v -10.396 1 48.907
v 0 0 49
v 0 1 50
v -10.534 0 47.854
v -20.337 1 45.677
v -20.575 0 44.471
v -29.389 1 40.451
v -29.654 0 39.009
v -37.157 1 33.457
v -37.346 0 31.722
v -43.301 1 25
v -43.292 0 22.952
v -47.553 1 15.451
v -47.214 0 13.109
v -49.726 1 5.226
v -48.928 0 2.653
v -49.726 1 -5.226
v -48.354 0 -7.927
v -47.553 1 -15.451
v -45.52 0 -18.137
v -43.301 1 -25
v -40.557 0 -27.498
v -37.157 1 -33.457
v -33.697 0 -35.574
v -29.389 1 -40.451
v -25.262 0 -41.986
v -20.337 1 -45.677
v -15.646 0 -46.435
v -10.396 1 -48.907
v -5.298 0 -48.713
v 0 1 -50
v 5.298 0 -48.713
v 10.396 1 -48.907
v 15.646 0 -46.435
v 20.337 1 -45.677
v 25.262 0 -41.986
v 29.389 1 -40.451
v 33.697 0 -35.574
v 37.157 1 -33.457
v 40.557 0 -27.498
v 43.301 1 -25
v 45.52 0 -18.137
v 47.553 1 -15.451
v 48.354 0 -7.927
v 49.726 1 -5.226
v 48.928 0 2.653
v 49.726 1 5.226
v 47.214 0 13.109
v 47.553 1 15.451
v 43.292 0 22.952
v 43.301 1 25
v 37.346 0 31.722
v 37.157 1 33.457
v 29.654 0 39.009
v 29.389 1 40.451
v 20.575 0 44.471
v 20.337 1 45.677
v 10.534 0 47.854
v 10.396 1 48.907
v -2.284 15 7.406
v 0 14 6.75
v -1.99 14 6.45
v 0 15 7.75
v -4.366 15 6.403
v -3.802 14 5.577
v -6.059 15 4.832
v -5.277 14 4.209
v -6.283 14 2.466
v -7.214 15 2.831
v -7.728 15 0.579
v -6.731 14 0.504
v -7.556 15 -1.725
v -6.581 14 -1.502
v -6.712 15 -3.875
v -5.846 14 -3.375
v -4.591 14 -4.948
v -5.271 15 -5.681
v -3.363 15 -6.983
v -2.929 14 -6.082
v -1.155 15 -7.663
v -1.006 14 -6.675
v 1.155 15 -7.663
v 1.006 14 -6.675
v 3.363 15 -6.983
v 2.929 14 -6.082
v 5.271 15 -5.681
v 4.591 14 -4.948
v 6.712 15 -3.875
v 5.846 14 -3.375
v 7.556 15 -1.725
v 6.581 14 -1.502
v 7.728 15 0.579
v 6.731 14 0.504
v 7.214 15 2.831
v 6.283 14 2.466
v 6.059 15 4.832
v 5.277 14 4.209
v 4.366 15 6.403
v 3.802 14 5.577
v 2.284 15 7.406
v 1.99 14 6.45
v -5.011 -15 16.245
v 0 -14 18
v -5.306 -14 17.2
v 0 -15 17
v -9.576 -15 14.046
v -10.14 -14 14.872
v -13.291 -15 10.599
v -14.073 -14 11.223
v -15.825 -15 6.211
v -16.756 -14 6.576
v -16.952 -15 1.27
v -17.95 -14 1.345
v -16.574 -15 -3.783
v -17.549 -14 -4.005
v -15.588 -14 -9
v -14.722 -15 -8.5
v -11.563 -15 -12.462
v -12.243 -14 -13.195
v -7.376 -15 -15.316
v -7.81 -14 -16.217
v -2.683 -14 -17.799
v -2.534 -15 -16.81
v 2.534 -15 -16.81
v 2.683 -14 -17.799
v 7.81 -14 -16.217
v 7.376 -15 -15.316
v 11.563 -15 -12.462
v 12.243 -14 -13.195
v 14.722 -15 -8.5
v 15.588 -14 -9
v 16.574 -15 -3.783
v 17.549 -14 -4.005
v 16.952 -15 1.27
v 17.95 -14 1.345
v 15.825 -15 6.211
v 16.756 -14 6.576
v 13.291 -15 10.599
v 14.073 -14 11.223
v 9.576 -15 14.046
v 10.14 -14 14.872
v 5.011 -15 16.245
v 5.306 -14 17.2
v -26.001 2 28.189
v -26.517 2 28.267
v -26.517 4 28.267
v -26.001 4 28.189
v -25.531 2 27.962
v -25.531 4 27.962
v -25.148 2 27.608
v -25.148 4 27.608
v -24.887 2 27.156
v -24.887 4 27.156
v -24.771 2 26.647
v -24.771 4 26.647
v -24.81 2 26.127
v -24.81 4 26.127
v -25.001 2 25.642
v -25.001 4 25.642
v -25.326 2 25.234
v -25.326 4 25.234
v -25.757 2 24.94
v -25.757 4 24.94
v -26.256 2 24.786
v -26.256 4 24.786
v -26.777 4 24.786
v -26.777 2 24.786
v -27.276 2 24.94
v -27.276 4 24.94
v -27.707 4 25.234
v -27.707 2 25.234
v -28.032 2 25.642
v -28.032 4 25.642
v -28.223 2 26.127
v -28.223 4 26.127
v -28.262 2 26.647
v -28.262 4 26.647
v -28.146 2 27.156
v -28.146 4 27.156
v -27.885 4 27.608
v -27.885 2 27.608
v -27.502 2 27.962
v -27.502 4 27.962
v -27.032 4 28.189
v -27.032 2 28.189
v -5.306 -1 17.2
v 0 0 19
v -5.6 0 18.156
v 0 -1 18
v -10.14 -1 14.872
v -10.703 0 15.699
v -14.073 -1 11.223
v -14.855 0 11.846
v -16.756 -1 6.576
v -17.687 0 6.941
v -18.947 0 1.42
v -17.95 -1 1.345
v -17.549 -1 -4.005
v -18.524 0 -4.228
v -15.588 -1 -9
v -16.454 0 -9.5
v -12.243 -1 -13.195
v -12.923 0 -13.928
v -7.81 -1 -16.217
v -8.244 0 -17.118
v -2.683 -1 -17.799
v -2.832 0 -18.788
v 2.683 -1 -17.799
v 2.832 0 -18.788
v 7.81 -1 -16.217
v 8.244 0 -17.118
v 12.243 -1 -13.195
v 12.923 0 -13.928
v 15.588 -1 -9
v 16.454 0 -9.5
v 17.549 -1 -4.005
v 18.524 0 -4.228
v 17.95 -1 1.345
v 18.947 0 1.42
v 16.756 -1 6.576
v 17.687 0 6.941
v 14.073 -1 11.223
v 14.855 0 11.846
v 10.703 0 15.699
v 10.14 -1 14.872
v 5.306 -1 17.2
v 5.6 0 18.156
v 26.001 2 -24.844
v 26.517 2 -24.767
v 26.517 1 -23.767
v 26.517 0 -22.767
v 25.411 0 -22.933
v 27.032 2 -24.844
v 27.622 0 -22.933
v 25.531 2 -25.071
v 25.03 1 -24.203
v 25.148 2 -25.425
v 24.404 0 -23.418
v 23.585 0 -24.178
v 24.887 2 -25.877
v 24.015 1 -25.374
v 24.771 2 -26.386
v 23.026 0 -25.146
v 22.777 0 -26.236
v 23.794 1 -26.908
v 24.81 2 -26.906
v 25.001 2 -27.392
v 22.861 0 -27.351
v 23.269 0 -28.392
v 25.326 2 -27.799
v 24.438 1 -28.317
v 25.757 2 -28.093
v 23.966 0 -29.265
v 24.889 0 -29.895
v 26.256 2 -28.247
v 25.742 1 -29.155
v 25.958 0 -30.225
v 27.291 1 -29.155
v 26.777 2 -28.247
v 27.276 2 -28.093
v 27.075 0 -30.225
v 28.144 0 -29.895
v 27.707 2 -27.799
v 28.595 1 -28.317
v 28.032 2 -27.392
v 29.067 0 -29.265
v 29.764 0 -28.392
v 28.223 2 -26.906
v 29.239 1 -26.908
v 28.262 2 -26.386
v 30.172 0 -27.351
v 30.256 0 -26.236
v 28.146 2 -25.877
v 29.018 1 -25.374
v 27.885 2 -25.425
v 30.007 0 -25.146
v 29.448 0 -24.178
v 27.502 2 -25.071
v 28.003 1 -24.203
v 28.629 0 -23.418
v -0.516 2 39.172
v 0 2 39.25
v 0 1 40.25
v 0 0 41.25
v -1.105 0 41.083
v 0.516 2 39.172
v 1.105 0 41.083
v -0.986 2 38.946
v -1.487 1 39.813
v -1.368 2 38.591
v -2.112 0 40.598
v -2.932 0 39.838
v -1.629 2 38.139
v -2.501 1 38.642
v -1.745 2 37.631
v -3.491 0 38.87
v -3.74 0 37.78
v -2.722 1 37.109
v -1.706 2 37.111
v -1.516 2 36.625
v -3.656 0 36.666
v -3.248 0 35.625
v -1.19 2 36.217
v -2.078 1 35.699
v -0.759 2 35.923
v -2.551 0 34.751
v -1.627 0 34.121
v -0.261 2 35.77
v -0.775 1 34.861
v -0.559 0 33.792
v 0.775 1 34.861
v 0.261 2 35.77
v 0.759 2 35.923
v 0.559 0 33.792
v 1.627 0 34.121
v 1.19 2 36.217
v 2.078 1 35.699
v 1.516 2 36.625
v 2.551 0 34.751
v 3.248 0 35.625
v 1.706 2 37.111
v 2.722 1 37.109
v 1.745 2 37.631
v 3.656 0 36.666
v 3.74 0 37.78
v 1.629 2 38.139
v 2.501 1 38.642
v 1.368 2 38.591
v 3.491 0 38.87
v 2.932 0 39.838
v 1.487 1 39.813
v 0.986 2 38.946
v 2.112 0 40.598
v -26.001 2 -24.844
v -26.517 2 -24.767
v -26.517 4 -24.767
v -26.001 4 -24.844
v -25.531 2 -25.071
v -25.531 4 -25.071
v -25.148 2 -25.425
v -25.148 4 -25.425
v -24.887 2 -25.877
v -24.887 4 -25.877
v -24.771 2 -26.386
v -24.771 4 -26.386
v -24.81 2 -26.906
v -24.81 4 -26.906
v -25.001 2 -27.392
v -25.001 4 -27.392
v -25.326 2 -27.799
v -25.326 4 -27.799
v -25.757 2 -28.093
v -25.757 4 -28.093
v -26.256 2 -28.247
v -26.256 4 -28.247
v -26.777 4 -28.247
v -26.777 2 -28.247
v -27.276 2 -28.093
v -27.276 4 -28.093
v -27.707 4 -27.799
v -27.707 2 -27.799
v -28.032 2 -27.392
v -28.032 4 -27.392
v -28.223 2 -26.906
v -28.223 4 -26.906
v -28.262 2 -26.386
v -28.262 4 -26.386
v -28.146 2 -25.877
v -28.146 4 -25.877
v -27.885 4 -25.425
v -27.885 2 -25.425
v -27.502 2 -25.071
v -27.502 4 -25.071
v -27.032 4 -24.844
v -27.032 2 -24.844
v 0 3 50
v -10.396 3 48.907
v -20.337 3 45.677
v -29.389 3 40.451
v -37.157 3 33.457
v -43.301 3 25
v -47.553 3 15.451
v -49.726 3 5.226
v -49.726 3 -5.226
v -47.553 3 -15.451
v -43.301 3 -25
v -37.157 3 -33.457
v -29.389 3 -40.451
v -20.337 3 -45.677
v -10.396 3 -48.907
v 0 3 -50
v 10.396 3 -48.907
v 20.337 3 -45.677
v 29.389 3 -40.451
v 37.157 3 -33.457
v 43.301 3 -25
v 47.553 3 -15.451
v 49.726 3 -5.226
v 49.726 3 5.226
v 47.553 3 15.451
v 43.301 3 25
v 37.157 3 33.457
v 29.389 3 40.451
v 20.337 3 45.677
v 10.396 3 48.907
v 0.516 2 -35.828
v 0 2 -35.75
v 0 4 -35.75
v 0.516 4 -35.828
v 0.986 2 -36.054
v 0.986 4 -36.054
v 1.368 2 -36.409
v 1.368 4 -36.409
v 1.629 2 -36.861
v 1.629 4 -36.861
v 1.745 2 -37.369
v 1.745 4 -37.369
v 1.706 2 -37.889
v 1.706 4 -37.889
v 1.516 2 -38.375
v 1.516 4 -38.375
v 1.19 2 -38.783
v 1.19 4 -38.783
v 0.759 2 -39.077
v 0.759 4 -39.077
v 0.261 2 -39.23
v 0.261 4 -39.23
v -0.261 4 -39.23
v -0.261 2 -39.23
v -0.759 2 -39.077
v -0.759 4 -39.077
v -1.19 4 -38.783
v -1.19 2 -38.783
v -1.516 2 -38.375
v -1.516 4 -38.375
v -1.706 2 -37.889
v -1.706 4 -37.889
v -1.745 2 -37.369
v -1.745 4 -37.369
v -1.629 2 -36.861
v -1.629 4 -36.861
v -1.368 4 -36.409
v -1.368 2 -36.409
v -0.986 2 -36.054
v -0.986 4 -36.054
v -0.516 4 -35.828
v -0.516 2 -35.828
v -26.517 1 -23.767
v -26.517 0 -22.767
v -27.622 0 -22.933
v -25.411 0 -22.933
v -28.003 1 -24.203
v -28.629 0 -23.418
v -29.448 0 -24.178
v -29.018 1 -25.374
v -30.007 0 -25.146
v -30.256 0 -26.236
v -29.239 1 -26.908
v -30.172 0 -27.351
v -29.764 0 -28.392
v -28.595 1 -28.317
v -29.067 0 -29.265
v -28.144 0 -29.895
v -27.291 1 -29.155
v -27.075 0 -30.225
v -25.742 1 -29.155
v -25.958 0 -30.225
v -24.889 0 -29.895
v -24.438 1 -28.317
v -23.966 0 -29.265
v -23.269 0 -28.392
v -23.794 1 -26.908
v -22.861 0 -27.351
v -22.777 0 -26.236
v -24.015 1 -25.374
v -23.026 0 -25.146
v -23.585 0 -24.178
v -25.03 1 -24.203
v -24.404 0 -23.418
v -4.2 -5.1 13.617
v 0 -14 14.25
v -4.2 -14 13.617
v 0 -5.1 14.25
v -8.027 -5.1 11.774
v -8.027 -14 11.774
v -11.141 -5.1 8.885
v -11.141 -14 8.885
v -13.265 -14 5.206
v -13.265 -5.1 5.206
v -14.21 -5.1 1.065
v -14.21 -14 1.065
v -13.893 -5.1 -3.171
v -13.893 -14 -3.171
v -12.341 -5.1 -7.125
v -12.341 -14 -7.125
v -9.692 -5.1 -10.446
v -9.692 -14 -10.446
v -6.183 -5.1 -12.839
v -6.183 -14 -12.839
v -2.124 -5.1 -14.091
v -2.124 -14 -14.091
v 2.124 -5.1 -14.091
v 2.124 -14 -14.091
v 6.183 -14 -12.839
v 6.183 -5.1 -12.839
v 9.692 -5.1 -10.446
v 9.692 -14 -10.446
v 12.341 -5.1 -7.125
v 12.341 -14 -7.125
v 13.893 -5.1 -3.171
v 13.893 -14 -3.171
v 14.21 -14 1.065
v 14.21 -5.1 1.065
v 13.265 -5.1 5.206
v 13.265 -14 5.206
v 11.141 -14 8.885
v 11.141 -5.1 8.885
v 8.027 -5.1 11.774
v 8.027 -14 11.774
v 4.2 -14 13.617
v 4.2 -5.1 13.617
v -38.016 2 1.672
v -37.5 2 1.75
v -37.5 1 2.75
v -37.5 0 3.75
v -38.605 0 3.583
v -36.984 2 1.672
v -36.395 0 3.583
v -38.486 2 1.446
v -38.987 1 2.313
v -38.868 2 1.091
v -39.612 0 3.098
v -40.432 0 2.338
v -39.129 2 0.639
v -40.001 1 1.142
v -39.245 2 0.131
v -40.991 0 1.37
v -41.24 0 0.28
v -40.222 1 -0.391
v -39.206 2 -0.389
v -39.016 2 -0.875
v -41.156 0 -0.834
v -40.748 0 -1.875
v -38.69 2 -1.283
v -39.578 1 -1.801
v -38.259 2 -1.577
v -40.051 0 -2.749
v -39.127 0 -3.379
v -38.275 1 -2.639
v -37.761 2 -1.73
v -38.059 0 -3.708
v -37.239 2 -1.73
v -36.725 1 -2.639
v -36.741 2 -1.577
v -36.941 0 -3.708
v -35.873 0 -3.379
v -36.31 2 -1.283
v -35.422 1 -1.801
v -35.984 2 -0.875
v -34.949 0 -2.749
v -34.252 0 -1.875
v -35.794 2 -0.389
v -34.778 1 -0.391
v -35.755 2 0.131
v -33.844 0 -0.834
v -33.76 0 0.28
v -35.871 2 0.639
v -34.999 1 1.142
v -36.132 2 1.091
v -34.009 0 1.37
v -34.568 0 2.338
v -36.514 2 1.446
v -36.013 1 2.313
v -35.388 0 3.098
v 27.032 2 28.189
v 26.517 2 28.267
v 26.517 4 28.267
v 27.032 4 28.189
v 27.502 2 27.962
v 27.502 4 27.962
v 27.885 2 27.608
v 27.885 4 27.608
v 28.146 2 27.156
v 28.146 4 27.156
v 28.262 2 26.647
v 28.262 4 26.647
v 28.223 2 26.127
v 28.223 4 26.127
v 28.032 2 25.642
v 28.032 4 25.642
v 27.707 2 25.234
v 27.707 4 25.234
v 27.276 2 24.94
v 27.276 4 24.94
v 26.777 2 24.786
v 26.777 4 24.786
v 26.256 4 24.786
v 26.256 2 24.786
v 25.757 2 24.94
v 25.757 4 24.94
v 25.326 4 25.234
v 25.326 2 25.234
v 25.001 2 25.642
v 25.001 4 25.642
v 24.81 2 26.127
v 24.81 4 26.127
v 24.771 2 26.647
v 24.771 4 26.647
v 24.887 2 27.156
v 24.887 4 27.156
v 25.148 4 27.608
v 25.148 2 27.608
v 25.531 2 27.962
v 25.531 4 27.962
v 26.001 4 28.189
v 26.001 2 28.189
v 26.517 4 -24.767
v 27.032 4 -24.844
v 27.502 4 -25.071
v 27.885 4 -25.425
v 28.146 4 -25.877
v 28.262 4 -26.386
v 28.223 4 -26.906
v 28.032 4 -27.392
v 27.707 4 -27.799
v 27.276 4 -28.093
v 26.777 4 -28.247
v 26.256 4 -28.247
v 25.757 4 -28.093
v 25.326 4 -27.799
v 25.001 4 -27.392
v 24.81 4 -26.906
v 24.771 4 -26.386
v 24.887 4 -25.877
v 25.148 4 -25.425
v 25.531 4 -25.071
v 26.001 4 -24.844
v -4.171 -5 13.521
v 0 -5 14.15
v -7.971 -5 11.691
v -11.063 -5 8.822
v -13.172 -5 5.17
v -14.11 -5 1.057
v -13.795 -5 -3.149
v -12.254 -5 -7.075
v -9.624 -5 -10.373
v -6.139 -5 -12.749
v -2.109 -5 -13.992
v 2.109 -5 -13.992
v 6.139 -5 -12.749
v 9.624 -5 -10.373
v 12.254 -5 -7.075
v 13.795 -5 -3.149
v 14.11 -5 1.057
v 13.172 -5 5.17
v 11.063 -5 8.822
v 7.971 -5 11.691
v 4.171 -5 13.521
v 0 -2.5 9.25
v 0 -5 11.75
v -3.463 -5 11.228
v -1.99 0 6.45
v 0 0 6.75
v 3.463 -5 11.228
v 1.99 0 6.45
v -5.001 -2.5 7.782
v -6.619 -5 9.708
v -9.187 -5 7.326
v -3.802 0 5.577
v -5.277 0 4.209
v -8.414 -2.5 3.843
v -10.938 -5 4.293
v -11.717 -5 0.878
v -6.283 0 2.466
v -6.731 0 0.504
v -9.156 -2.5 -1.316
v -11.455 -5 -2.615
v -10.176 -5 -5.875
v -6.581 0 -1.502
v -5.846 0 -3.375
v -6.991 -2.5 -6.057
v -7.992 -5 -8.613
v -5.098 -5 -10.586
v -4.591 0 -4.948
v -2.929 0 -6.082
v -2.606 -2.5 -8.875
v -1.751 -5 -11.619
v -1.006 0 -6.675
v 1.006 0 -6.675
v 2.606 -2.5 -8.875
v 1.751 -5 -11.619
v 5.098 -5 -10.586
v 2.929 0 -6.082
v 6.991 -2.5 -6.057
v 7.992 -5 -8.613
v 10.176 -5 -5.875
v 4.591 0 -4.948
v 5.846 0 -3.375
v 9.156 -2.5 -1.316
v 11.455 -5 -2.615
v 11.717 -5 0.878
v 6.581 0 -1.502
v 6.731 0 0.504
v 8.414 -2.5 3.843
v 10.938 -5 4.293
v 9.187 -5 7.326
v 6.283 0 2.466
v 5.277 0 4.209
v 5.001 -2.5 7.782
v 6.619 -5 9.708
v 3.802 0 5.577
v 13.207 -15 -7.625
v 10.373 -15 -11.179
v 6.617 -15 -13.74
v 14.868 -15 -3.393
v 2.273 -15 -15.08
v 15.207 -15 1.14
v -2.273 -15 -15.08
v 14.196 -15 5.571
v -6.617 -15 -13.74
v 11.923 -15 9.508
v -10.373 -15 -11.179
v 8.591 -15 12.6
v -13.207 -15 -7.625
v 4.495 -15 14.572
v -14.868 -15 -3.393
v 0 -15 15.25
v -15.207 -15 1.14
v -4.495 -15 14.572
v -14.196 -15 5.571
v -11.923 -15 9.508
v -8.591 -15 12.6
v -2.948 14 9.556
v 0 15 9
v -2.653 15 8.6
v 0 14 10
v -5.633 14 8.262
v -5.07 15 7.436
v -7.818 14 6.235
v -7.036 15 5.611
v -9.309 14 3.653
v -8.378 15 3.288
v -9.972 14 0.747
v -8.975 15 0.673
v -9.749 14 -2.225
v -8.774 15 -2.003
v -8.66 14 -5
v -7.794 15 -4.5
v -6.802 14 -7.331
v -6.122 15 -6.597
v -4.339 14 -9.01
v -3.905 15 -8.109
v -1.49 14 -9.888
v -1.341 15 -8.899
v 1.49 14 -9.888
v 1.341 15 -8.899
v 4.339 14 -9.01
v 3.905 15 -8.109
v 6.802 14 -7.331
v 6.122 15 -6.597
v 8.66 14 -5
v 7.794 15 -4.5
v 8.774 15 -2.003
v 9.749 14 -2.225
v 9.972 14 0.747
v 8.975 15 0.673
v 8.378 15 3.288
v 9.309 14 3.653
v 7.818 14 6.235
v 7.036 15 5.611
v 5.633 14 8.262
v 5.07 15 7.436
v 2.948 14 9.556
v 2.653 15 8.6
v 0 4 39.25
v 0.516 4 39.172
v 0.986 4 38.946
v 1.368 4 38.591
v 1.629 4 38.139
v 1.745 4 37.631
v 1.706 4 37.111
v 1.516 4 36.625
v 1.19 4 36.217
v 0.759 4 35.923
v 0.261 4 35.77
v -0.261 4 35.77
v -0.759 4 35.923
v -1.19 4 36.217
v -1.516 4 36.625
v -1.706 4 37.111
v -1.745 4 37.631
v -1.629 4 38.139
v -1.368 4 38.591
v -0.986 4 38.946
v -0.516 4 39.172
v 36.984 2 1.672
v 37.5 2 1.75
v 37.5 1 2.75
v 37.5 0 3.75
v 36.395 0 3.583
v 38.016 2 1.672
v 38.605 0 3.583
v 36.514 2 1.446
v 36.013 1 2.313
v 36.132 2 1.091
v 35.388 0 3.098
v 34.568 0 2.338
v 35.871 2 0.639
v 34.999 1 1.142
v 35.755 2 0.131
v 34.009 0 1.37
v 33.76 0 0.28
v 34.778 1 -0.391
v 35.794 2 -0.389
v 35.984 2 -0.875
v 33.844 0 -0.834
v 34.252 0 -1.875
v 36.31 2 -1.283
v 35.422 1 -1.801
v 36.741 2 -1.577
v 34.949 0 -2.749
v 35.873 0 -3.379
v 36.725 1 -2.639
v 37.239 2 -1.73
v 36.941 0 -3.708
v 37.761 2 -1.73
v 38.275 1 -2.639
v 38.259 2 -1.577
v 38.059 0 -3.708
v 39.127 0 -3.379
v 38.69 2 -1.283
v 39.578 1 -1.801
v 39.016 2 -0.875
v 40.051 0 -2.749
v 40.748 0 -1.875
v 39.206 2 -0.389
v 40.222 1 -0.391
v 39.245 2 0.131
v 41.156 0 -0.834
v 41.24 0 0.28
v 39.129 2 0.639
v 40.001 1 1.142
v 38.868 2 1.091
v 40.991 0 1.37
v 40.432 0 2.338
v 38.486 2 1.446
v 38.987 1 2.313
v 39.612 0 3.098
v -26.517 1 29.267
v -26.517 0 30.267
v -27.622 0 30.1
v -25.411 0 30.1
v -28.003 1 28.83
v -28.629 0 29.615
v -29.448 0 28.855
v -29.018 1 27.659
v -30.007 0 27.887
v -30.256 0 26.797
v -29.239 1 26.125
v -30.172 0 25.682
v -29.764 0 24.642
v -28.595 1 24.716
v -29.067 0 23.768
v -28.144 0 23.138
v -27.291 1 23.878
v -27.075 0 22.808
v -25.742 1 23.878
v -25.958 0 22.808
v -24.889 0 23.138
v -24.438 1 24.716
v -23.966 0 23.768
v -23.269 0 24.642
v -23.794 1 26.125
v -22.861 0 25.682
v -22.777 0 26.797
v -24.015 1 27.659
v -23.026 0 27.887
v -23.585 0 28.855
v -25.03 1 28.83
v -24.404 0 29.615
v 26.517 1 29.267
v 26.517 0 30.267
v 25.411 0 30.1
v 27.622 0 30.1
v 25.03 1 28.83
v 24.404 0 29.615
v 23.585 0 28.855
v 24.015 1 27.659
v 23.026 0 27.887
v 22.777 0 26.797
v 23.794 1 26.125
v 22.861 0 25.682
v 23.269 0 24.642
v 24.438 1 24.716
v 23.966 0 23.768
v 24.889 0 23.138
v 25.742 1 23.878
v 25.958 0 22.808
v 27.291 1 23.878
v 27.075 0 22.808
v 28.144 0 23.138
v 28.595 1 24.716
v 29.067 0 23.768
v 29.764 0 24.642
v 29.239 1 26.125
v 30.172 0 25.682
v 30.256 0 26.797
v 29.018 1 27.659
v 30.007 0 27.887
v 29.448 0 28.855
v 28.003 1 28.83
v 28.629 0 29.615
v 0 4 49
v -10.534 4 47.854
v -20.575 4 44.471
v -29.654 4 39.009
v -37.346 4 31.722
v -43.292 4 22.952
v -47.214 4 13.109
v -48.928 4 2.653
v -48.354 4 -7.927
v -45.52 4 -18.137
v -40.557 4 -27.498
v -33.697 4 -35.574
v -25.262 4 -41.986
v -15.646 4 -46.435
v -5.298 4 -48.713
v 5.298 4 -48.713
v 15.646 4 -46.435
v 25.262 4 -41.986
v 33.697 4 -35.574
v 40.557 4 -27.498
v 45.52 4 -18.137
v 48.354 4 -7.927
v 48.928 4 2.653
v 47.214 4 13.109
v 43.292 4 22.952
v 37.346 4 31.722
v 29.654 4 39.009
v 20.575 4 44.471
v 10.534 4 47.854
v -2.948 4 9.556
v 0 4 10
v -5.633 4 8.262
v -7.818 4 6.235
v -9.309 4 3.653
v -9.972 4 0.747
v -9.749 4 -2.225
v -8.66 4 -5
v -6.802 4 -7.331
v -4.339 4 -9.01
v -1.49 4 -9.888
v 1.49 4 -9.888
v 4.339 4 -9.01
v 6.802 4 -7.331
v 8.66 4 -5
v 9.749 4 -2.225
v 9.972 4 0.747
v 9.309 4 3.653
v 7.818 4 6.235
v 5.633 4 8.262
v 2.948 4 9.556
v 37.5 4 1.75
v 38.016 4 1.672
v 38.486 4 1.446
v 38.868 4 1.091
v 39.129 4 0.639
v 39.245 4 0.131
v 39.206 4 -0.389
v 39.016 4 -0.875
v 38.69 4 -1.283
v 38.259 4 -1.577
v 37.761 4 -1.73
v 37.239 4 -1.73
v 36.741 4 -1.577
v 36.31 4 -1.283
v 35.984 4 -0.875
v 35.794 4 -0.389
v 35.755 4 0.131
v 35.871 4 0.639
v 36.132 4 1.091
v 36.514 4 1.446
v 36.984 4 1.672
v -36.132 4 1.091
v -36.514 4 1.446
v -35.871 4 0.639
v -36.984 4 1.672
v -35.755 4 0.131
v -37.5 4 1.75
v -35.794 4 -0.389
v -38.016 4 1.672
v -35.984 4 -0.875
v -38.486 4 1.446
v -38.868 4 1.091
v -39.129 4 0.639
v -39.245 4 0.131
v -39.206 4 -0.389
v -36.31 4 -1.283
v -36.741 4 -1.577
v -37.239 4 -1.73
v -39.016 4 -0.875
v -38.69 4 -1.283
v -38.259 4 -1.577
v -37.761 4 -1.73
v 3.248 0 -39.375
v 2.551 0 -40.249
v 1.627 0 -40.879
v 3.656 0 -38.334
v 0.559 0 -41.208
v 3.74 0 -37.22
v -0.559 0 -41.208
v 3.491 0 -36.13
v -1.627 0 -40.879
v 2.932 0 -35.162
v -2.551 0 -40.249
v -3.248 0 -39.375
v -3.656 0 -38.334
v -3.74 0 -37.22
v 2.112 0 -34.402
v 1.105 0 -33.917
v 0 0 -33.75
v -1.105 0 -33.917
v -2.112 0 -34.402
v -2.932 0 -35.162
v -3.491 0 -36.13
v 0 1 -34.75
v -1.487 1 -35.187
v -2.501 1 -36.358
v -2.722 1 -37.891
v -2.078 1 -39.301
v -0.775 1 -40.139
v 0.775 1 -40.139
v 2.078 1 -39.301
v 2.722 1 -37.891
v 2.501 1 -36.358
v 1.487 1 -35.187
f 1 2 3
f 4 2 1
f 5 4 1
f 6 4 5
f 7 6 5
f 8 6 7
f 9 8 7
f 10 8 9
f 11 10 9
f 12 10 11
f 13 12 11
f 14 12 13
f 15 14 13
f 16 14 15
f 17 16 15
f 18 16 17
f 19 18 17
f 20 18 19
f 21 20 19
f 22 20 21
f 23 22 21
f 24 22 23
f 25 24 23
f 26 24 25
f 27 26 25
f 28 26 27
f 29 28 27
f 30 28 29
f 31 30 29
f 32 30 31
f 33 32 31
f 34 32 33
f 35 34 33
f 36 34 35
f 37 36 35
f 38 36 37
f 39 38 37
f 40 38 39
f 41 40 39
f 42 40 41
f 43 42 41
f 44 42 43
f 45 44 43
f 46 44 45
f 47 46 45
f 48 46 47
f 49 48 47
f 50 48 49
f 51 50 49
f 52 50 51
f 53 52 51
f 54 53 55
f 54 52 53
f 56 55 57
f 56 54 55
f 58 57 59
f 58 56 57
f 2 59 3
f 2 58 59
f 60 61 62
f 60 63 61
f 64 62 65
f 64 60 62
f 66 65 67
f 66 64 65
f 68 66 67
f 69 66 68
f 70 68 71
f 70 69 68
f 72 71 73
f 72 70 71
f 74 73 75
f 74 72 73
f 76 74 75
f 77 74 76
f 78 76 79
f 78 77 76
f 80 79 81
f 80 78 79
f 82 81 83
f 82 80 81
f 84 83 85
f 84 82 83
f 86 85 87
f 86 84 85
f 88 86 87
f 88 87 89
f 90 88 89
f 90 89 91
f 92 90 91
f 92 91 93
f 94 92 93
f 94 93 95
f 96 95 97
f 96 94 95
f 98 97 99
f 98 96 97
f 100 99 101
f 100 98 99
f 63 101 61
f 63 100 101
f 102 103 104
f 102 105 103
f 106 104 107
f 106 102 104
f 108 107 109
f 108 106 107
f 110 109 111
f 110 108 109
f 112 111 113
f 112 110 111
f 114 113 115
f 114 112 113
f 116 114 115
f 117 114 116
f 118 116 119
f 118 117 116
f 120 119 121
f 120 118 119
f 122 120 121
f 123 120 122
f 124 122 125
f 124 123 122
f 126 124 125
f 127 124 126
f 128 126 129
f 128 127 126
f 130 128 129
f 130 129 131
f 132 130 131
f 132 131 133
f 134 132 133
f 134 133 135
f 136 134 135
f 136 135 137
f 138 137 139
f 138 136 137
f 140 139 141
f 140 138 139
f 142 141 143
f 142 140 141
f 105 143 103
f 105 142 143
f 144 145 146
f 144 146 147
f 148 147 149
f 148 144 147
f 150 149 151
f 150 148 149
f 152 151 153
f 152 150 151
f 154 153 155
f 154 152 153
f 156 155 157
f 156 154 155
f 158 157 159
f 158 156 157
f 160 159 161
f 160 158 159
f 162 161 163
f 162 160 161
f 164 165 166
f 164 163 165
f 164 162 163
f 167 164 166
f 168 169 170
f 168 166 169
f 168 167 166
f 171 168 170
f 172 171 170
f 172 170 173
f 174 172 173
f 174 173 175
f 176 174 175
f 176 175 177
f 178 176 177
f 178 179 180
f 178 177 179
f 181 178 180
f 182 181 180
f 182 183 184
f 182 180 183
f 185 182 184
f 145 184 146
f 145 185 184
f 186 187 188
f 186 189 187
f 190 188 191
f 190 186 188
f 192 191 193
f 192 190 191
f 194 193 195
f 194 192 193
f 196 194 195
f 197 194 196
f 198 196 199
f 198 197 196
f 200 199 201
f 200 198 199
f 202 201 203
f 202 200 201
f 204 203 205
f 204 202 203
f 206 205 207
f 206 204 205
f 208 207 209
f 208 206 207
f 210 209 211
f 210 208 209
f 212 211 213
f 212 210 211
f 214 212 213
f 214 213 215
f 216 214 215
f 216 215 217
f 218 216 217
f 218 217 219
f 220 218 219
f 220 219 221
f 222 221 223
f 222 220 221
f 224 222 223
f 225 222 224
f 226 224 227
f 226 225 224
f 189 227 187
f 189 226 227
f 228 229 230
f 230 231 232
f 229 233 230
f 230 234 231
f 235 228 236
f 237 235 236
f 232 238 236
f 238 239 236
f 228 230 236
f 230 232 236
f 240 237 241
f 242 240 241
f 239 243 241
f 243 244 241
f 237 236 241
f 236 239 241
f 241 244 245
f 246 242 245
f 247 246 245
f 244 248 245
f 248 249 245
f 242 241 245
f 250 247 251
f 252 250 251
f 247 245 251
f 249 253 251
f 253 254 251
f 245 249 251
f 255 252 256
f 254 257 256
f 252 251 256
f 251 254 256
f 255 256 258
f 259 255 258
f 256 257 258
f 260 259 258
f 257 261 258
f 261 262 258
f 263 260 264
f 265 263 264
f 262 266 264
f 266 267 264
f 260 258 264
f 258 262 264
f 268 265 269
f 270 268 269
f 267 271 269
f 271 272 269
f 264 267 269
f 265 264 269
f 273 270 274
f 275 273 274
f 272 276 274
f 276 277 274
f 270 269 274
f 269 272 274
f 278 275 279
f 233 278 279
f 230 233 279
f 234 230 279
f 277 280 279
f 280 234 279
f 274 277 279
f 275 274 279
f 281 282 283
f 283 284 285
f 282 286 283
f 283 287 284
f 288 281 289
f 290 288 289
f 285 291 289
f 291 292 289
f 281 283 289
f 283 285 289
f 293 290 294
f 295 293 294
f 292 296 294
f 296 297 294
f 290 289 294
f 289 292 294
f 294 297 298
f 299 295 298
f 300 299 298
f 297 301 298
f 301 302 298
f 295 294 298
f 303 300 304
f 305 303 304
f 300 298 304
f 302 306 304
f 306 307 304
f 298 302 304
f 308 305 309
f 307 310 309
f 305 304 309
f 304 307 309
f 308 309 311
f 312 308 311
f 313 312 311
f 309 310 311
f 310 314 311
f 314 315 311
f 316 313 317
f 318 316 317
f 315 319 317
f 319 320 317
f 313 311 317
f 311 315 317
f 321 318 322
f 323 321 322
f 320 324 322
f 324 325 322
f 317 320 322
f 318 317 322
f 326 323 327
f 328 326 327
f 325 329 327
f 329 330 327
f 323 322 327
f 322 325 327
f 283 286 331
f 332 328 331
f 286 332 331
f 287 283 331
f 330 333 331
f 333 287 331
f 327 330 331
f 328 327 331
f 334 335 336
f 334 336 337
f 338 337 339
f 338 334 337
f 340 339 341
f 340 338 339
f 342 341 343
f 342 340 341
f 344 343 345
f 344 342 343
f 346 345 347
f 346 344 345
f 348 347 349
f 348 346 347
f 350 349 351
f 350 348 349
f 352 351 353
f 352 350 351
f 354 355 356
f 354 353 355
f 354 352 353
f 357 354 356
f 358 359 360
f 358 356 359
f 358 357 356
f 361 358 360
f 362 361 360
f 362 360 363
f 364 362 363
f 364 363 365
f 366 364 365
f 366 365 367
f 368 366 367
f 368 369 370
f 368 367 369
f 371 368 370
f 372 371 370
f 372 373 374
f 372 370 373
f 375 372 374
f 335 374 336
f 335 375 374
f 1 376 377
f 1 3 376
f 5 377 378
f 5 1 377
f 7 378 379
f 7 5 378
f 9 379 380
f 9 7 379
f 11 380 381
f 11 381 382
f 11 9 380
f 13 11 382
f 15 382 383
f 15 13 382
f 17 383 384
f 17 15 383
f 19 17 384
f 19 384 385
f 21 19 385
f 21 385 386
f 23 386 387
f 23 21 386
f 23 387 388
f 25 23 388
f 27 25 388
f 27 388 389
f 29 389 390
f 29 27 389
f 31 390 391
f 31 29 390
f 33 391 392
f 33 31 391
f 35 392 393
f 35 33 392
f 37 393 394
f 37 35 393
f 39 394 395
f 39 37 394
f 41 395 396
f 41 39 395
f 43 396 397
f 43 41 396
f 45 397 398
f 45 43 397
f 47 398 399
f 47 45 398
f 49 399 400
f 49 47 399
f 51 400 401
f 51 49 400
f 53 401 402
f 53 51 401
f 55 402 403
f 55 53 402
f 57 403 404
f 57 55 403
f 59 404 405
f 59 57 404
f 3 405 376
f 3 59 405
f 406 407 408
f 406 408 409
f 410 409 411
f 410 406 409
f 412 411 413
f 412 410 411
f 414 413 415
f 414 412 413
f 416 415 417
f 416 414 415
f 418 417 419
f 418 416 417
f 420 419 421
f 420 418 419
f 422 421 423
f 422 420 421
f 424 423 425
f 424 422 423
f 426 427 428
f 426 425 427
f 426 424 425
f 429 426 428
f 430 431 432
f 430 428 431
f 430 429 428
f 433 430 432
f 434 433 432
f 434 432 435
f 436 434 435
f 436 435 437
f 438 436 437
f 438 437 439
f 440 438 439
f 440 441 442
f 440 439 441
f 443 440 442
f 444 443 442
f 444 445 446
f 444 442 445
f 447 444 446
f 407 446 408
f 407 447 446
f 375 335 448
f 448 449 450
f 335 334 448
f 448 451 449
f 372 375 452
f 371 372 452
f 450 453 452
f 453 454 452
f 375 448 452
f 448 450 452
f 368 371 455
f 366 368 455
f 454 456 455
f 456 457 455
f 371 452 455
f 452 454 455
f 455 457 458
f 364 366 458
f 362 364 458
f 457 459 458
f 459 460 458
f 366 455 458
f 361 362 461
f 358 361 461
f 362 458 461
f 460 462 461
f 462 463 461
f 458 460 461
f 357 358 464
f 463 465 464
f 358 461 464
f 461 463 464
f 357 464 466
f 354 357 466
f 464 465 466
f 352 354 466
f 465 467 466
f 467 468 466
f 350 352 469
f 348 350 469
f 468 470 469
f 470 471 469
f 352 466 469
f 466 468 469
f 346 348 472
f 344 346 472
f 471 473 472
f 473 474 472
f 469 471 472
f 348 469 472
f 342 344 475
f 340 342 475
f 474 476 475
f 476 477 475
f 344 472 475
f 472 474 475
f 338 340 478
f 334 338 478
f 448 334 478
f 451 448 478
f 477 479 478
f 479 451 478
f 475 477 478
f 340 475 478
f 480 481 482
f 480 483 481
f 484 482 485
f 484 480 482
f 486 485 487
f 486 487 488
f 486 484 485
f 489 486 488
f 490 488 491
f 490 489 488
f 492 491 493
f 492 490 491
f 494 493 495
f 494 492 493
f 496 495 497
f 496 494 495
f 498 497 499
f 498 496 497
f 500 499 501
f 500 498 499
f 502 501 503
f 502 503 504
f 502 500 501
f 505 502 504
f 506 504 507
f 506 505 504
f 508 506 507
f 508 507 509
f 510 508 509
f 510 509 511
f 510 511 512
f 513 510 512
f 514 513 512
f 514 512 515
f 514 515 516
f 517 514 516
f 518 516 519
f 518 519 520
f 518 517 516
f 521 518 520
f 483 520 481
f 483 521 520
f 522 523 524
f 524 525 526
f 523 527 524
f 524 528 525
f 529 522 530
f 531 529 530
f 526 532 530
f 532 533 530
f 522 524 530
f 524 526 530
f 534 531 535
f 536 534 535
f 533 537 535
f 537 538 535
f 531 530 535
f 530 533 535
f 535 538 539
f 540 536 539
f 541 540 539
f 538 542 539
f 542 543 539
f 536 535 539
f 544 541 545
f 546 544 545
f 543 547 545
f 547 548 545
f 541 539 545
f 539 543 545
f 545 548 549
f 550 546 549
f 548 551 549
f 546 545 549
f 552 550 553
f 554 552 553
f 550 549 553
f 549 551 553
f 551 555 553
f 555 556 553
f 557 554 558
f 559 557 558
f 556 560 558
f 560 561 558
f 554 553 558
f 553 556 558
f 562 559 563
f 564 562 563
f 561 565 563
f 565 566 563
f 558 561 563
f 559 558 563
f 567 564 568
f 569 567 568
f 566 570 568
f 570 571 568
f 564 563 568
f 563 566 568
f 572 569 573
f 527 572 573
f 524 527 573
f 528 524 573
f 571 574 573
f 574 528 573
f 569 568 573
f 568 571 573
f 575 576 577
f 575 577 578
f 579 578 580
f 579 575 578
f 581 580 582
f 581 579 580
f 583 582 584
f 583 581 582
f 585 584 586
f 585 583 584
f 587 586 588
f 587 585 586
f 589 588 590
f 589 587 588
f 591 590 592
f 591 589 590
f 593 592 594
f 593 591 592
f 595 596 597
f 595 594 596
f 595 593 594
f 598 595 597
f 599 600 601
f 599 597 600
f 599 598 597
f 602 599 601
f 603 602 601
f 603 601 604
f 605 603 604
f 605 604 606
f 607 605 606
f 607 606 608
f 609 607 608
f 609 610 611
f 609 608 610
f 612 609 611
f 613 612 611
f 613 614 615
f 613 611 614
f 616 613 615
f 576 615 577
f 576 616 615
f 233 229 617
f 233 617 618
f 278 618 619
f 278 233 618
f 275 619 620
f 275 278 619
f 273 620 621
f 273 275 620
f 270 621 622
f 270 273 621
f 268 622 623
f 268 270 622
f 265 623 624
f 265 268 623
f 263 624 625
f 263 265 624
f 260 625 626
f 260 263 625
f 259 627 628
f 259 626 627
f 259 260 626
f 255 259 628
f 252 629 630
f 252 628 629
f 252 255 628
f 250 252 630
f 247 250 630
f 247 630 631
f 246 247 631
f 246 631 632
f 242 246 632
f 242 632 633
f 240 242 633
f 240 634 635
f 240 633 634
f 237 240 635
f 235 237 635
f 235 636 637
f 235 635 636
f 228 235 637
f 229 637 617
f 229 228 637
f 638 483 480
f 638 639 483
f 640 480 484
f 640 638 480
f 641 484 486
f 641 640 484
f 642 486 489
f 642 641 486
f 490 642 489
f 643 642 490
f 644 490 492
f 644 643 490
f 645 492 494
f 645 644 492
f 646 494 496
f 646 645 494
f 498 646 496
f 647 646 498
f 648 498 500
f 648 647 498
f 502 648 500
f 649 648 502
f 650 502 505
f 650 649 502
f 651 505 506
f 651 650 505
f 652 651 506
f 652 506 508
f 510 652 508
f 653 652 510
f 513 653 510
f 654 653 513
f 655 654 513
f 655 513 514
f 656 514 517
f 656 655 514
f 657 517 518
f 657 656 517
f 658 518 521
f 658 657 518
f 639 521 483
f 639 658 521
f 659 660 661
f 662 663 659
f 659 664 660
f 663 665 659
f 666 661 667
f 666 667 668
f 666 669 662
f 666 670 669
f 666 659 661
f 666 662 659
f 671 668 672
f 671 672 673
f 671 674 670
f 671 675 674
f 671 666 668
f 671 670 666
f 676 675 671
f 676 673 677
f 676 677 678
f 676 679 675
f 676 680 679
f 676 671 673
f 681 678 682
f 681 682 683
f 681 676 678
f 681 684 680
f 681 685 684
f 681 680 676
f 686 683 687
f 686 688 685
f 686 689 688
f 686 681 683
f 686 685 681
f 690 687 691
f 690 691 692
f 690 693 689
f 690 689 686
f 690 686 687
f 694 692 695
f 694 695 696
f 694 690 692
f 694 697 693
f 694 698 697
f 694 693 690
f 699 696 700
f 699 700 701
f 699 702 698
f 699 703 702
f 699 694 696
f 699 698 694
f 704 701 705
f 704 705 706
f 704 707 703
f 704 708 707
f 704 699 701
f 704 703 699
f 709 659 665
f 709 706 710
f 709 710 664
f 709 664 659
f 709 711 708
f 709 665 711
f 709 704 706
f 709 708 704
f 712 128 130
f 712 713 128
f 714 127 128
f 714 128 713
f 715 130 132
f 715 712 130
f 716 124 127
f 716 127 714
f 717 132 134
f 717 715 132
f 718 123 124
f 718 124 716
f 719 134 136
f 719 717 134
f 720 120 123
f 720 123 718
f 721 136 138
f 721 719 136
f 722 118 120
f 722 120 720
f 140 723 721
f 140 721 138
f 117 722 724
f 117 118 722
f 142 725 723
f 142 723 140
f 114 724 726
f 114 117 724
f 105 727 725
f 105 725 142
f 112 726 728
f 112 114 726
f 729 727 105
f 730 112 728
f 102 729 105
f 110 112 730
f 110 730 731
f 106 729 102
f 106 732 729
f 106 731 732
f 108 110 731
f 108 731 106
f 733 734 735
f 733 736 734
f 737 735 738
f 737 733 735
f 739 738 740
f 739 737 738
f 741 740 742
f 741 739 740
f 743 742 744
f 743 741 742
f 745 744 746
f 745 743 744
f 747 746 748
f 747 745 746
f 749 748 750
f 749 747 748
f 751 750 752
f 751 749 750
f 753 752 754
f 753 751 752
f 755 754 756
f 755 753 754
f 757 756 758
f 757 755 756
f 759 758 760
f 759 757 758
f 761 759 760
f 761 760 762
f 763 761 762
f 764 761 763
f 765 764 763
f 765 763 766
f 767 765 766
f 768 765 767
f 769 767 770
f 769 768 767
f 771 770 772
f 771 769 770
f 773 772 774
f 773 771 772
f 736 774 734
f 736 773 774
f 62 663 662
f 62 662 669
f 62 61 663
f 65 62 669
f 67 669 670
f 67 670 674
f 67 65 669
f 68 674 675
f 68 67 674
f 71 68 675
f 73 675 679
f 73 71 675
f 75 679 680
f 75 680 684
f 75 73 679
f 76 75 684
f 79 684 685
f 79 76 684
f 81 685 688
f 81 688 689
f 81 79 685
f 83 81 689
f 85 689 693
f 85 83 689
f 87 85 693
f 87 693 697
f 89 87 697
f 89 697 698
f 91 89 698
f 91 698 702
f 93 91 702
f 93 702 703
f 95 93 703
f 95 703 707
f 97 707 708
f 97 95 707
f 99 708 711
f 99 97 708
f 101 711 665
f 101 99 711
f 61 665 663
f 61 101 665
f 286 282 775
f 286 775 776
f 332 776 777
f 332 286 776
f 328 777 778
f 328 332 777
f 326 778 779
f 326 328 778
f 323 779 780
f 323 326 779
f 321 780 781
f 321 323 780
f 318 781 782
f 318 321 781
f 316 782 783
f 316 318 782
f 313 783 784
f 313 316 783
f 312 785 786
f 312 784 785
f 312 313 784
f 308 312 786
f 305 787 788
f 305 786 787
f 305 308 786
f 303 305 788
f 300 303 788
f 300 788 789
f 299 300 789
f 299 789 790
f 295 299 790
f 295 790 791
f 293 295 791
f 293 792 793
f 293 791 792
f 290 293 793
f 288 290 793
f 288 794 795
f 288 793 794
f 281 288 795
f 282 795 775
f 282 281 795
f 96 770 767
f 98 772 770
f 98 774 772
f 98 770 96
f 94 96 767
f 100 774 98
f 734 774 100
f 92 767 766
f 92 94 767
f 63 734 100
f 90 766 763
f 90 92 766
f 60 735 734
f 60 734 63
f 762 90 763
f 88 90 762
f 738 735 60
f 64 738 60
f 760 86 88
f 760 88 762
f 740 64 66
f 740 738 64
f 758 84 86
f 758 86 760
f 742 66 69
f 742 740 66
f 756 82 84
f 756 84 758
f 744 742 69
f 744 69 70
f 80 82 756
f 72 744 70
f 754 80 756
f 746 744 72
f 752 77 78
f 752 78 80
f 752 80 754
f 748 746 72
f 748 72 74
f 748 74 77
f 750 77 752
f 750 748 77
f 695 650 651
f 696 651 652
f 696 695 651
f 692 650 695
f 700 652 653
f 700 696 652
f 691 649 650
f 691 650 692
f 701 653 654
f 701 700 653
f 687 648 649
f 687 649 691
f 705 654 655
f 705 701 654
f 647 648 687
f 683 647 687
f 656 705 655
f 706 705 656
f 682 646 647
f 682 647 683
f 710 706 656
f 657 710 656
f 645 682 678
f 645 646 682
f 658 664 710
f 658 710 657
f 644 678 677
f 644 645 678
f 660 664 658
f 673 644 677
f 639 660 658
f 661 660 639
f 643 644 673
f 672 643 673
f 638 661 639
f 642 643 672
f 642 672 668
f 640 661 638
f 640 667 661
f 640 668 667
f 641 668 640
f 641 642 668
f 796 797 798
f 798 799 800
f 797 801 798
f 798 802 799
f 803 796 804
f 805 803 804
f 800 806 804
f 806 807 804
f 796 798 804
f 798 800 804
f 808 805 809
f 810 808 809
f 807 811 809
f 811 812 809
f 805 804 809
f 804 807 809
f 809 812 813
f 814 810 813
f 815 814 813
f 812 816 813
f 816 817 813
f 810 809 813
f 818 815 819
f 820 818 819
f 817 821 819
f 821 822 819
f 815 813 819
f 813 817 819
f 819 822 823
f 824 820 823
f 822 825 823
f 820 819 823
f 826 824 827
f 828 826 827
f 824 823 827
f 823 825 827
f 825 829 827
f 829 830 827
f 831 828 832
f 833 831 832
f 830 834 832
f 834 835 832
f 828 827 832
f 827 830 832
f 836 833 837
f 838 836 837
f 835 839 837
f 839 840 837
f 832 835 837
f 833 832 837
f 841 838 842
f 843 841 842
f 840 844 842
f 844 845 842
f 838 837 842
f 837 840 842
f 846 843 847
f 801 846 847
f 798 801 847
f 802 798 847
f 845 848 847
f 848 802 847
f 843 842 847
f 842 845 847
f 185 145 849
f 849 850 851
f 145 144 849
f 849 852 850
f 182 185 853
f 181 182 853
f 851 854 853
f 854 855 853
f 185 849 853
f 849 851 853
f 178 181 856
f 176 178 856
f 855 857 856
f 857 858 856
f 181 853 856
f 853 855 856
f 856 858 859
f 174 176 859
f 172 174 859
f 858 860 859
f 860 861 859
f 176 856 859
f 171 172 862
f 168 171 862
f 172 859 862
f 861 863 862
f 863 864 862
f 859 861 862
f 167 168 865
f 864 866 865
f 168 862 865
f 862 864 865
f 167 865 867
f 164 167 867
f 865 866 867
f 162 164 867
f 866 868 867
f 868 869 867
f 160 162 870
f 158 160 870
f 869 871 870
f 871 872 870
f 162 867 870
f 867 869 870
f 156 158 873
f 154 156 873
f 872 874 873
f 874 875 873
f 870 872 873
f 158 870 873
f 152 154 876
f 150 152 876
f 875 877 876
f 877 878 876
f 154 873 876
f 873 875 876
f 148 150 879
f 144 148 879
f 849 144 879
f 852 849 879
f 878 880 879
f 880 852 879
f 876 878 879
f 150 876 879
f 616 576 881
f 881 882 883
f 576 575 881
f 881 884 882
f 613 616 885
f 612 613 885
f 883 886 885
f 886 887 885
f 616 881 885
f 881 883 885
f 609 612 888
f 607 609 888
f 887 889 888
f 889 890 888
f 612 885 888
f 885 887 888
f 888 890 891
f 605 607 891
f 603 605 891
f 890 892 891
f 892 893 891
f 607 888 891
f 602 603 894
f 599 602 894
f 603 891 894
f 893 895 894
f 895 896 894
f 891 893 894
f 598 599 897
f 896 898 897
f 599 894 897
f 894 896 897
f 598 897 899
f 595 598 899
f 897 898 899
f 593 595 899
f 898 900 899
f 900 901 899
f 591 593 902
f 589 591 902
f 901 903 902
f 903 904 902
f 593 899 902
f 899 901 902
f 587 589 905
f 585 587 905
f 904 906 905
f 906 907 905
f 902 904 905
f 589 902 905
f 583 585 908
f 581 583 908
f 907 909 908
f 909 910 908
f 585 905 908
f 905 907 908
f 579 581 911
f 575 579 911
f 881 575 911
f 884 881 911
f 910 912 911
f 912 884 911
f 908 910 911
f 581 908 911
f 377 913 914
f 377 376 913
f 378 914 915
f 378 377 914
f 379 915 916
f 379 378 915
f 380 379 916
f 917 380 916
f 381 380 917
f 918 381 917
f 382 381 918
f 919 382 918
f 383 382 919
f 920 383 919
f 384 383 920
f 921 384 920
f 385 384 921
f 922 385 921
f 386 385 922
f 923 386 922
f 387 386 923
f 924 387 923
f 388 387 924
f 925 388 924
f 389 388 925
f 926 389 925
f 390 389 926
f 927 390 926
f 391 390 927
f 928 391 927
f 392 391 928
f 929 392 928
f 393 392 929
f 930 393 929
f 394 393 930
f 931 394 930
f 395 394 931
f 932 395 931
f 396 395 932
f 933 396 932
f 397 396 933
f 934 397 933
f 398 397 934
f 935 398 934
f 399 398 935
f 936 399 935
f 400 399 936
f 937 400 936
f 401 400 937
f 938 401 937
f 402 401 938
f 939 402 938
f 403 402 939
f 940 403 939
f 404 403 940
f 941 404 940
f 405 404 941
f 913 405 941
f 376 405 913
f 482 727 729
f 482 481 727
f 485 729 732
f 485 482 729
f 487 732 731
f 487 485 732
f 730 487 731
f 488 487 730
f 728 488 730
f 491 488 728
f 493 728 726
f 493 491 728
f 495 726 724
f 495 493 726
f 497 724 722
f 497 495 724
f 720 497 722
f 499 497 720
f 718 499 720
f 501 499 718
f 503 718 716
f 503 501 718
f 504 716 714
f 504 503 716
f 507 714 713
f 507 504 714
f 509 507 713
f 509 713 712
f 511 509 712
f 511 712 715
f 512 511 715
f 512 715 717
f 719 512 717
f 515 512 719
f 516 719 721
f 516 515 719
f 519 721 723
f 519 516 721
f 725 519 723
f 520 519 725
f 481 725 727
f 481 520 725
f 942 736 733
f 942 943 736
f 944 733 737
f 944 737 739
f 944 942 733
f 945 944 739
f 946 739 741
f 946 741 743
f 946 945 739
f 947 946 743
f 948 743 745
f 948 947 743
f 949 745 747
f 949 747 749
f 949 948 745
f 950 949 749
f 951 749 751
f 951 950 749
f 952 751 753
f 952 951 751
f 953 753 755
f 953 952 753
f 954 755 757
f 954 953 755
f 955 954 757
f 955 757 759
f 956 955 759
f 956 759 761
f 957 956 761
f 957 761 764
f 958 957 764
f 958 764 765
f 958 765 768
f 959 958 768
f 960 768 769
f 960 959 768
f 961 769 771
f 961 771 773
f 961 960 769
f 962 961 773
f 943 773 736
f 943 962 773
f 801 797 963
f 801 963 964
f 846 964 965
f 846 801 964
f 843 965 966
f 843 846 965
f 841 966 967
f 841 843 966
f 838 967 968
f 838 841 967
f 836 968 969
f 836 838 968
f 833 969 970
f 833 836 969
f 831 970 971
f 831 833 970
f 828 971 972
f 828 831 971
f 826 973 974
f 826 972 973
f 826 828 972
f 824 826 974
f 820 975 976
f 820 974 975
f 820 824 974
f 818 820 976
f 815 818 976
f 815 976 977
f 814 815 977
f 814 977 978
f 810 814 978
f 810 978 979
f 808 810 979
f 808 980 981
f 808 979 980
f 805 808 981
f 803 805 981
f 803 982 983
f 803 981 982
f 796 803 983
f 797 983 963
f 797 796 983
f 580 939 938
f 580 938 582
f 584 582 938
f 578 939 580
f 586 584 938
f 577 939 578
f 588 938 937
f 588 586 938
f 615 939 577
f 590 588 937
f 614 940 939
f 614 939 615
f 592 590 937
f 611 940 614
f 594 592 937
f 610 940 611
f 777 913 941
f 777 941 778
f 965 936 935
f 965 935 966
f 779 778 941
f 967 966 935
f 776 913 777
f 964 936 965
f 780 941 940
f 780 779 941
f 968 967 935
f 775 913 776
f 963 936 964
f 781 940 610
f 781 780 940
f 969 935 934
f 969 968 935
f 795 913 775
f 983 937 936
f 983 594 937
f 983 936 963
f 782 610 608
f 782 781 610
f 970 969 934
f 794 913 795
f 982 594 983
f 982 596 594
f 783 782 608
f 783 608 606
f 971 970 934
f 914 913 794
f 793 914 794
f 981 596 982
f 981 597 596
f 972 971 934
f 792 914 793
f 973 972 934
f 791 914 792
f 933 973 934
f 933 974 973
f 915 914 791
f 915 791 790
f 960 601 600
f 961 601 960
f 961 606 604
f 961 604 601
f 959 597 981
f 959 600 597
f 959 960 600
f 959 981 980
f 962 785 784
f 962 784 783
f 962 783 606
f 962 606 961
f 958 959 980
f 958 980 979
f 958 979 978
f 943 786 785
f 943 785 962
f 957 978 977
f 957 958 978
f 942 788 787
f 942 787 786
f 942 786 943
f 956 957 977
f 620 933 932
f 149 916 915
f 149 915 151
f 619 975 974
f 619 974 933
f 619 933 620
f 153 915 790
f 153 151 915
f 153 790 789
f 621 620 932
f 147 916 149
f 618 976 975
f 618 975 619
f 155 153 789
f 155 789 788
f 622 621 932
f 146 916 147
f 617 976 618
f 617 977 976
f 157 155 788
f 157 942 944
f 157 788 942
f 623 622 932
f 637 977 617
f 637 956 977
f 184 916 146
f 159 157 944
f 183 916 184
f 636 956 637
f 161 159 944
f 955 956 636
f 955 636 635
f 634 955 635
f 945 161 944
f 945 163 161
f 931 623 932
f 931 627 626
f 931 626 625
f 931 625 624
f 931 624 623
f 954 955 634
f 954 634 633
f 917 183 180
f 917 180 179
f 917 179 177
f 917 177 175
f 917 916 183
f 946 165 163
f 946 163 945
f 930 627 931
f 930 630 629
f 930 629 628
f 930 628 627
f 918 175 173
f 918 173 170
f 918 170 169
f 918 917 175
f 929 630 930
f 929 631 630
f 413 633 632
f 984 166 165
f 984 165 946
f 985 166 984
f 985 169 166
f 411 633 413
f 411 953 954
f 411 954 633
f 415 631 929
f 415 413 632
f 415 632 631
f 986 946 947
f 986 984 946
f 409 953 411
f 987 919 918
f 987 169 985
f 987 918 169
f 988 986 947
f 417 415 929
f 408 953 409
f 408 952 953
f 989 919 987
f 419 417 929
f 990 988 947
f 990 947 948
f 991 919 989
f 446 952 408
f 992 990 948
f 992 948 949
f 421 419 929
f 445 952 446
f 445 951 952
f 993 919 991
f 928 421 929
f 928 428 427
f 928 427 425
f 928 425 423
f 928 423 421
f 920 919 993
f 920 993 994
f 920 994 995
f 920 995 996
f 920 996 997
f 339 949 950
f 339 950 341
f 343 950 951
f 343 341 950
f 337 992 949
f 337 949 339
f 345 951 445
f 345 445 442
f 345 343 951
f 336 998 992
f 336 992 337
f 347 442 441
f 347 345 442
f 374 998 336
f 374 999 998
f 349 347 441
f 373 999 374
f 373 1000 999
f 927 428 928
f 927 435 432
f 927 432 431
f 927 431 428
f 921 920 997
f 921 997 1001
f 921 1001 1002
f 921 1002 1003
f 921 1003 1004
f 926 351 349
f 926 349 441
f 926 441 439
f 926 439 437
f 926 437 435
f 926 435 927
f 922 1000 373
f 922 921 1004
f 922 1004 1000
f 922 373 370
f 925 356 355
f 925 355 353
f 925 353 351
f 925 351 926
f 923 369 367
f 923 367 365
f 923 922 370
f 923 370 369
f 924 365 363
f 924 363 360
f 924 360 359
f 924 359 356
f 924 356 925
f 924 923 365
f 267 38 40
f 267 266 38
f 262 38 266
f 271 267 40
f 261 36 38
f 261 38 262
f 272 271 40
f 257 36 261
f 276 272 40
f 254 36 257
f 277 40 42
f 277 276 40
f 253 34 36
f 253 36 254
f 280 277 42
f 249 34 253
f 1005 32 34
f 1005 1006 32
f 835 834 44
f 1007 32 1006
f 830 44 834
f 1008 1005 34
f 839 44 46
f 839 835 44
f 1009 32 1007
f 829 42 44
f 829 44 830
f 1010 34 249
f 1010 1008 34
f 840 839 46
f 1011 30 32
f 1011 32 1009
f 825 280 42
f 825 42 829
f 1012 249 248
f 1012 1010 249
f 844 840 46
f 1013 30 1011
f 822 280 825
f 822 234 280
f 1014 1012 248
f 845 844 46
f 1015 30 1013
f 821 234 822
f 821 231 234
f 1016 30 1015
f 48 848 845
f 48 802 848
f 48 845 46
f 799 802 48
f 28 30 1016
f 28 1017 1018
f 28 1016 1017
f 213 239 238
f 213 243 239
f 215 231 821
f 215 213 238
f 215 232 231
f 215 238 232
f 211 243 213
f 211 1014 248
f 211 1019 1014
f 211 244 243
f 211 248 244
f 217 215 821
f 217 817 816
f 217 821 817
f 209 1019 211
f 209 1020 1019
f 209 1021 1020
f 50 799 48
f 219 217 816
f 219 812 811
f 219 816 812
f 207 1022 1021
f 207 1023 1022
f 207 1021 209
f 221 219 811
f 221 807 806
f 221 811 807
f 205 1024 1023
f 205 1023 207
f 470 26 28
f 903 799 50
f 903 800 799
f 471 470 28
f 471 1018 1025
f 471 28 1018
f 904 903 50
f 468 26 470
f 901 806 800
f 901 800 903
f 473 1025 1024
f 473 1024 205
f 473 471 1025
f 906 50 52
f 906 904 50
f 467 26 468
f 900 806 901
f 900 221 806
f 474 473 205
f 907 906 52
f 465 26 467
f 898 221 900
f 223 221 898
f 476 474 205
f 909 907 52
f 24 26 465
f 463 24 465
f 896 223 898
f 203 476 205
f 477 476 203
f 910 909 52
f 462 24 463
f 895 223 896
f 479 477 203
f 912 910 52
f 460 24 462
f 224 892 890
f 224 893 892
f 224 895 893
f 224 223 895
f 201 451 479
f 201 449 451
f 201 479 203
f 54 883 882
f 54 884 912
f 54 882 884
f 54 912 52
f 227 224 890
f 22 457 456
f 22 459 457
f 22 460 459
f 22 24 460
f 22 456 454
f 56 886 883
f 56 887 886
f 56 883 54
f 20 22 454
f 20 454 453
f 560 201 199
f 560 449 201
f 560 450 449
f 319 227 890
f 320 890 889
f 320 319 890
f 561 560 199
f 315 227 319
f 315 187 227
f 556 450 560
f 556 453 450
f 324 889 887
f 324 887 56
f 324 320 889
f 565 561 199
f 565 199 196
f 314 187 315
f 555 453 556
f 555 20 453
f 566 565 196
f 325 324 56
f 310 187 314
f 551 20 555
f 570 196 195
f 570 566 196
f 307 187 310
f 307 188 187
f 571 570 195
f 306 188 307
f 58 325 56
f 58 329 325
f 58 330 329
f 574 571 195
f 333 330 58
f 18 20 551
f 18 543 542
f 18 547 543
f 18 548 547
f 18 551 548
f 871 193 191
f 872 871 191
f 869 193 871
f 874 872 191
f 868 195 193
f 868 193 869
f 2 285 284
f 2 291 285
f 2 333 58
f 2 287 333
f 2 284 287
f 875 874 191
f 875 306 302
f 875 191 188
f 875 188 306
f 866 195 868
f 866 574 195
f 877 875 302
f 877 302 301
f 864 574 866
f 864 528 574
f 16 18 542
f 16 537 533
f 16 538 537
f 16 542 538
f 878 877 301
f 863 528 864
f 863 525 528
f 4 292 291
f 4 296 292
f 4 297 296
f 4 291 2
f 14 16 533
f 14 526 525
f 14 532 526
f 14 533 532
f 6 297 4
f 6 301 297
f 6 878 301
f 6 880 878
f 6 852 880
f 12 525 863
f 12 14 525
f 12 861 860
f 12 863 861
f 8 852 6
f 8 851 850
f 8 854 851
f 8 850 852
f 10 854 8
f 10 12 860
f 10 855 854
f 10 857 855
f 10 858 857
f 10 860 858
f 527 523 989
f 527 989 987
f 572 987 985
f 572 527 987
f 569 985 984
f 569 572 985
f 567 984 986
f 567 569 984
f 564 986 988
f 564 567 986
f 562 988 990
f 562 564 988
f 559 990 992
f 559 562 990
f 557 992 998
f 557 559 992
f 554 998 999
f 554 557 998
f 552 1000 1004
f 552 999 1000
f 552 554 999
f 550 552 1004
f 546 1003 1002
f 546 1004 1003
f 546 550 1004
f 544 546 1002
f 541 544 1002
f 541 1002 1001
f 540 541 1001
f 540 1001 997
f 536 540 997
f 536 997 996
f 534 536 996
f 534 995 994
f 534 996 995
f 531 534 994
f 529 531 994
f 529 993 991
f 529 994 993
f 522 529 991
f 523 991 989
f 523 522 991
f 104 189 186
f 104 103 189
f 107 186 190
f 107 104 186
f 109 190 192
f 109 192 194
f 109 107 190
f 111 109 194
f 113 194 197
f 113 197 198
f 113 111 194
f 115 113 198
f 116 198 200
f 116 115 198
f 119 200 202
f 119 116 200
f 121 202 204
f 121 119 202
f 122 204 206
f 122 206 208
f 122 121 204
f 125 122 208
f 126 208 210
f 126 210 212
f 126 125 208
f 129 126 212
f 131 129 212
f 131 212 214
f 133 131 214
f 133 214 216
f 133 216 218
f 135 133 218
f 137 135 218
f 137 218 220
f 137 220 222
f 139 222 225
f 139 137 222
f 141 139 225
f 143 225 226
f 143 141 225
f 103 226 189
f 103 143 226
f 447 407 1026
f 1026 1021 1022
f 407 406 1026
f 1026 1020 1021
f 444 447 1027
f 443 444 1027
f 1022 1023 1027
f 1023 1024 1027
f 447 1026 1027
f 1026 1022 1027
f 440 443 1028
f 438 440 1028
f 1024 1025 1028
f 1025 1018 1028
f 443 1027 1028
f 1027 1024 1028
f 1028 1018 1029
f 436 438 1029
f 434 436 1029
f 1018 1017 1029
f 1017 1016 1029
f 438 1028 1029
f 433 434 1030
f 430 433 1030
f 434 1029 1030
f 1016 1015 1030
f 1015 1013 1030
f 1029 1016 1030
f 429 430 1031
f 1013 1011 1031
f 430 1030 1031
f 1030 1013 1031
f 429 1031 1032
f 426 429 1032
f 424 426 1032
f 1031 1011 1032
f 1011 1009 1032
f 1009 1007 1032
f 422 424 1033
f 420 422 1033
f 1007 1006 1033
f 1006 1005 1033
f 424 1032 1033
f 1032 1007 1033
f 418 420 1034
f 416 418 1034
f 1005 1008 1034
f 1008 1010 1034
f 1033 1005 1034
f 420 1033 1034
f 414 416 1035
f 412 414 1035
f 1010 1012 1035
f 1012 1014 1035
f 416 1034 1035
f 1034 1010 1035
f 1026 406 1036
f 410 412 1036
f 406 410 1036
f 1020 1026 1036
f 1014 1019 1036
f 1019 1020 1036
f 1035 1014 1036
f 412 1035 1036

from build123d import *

# Parameters (mm, degrees)
CUT_EXTRUDE1_DEPTH      = 74.218850032
CUT_EXTRUDE1_DEPTH_BACK = 74.218850032
SKETCH2_R               = 1.75
CHAMFER1_SIZE           = 2


with BuildPart() as part:
    # Sketch1 → Revolve1 (revolve)
    with BuildSketch(Plane(origin=(0, 0, 0), x_dir=(0, 0, -1), z_dir=(1, 0, 0))):
        Polygon((-10, 14), (-10, 4), (-49, 4), (-50, 3), (-50, 1), (-49, 0), (-19, 0), (-18, -1), (-18, -14), (-17, -15), (-15.25, -15), (-14.25, -14), (-14.25, -5.1), (-14.15, -5), (-11.75, -5), (-6.75, 0), (-6.75, 14), (-7.75, 15), (-9, 15), align=None)
    revolve(axis=Axis((0, 143.307692308, 0), (0, -1, 0)))

    # Sketch2 → Cut-Extrude1 (cut, two sides: drawn at the far end of the back side and taken through both)
    with BuildSketch(Plane(origin=(0, 4, 0), x_dir=(1, 0, 0), z_dir=(0, 1, 0)).offset(-CUT_EXTRUDE1_DEPTH_BACK)):
        with Locations(Location((0, 37.5, 0), (0, 0, 270))):
            Circle(SKETCH2_R)
        with Locations(Location((26.516504294, 26.516504294, 0), (0, 0, 270))):
            Circle(SKETCH2_R)
        with Locations(Location((37.5, 0, 0), (0, 0, 270))):
            Circle(SKETCH2_R)
        with Locations(Location((26.516504294, -26.516504294, 0), (0, 0, 270))):
            Circle(SKETCH2_R)
        with Locations(Location((0, -37.5, 0), (0, 0, 270))):
            Circle(SKETCH2_R)
        with Locations(Location((-26.516504294, -26.516504294, 0), (0, 0, 270))):
            Circle(SKETCH2_R)
        with Locations(Location((-37.5, 0, 0), (0, 0, 270))):
            Circle(SKETCH2_R)
        with Locations(Location((-26.516504294, 26.516504294, 0), (0, 0, 270))):
            Circle(SKETCH2_R)
    extrude(amount=CUT_EXTRUDE1_DEPTH + CUT_EXTRUDE1_DEPTH_BACK, mode=Mode.SUBTRACT)

    # Chamfer1
    chamfer1_edges = [part.edges().sort_by_distance(p)[0] for p in [
        (0, 0, -39.25),
        (26.516504294, 0, -28.266504294),
        (37.5, 0, -1.75),
        (26.516504294, 0, 24.766504294),
        (0, 0, 35.75),
        (-26.516504294, 0, 24.766504294),
        (-37.5, 0, -1.75),
        (-26.516504294, 0, -28.266504294),
    ]]
    chamfer(chamfer1_edges, length=CHAMFER1_SIZE)


solid = part.part
